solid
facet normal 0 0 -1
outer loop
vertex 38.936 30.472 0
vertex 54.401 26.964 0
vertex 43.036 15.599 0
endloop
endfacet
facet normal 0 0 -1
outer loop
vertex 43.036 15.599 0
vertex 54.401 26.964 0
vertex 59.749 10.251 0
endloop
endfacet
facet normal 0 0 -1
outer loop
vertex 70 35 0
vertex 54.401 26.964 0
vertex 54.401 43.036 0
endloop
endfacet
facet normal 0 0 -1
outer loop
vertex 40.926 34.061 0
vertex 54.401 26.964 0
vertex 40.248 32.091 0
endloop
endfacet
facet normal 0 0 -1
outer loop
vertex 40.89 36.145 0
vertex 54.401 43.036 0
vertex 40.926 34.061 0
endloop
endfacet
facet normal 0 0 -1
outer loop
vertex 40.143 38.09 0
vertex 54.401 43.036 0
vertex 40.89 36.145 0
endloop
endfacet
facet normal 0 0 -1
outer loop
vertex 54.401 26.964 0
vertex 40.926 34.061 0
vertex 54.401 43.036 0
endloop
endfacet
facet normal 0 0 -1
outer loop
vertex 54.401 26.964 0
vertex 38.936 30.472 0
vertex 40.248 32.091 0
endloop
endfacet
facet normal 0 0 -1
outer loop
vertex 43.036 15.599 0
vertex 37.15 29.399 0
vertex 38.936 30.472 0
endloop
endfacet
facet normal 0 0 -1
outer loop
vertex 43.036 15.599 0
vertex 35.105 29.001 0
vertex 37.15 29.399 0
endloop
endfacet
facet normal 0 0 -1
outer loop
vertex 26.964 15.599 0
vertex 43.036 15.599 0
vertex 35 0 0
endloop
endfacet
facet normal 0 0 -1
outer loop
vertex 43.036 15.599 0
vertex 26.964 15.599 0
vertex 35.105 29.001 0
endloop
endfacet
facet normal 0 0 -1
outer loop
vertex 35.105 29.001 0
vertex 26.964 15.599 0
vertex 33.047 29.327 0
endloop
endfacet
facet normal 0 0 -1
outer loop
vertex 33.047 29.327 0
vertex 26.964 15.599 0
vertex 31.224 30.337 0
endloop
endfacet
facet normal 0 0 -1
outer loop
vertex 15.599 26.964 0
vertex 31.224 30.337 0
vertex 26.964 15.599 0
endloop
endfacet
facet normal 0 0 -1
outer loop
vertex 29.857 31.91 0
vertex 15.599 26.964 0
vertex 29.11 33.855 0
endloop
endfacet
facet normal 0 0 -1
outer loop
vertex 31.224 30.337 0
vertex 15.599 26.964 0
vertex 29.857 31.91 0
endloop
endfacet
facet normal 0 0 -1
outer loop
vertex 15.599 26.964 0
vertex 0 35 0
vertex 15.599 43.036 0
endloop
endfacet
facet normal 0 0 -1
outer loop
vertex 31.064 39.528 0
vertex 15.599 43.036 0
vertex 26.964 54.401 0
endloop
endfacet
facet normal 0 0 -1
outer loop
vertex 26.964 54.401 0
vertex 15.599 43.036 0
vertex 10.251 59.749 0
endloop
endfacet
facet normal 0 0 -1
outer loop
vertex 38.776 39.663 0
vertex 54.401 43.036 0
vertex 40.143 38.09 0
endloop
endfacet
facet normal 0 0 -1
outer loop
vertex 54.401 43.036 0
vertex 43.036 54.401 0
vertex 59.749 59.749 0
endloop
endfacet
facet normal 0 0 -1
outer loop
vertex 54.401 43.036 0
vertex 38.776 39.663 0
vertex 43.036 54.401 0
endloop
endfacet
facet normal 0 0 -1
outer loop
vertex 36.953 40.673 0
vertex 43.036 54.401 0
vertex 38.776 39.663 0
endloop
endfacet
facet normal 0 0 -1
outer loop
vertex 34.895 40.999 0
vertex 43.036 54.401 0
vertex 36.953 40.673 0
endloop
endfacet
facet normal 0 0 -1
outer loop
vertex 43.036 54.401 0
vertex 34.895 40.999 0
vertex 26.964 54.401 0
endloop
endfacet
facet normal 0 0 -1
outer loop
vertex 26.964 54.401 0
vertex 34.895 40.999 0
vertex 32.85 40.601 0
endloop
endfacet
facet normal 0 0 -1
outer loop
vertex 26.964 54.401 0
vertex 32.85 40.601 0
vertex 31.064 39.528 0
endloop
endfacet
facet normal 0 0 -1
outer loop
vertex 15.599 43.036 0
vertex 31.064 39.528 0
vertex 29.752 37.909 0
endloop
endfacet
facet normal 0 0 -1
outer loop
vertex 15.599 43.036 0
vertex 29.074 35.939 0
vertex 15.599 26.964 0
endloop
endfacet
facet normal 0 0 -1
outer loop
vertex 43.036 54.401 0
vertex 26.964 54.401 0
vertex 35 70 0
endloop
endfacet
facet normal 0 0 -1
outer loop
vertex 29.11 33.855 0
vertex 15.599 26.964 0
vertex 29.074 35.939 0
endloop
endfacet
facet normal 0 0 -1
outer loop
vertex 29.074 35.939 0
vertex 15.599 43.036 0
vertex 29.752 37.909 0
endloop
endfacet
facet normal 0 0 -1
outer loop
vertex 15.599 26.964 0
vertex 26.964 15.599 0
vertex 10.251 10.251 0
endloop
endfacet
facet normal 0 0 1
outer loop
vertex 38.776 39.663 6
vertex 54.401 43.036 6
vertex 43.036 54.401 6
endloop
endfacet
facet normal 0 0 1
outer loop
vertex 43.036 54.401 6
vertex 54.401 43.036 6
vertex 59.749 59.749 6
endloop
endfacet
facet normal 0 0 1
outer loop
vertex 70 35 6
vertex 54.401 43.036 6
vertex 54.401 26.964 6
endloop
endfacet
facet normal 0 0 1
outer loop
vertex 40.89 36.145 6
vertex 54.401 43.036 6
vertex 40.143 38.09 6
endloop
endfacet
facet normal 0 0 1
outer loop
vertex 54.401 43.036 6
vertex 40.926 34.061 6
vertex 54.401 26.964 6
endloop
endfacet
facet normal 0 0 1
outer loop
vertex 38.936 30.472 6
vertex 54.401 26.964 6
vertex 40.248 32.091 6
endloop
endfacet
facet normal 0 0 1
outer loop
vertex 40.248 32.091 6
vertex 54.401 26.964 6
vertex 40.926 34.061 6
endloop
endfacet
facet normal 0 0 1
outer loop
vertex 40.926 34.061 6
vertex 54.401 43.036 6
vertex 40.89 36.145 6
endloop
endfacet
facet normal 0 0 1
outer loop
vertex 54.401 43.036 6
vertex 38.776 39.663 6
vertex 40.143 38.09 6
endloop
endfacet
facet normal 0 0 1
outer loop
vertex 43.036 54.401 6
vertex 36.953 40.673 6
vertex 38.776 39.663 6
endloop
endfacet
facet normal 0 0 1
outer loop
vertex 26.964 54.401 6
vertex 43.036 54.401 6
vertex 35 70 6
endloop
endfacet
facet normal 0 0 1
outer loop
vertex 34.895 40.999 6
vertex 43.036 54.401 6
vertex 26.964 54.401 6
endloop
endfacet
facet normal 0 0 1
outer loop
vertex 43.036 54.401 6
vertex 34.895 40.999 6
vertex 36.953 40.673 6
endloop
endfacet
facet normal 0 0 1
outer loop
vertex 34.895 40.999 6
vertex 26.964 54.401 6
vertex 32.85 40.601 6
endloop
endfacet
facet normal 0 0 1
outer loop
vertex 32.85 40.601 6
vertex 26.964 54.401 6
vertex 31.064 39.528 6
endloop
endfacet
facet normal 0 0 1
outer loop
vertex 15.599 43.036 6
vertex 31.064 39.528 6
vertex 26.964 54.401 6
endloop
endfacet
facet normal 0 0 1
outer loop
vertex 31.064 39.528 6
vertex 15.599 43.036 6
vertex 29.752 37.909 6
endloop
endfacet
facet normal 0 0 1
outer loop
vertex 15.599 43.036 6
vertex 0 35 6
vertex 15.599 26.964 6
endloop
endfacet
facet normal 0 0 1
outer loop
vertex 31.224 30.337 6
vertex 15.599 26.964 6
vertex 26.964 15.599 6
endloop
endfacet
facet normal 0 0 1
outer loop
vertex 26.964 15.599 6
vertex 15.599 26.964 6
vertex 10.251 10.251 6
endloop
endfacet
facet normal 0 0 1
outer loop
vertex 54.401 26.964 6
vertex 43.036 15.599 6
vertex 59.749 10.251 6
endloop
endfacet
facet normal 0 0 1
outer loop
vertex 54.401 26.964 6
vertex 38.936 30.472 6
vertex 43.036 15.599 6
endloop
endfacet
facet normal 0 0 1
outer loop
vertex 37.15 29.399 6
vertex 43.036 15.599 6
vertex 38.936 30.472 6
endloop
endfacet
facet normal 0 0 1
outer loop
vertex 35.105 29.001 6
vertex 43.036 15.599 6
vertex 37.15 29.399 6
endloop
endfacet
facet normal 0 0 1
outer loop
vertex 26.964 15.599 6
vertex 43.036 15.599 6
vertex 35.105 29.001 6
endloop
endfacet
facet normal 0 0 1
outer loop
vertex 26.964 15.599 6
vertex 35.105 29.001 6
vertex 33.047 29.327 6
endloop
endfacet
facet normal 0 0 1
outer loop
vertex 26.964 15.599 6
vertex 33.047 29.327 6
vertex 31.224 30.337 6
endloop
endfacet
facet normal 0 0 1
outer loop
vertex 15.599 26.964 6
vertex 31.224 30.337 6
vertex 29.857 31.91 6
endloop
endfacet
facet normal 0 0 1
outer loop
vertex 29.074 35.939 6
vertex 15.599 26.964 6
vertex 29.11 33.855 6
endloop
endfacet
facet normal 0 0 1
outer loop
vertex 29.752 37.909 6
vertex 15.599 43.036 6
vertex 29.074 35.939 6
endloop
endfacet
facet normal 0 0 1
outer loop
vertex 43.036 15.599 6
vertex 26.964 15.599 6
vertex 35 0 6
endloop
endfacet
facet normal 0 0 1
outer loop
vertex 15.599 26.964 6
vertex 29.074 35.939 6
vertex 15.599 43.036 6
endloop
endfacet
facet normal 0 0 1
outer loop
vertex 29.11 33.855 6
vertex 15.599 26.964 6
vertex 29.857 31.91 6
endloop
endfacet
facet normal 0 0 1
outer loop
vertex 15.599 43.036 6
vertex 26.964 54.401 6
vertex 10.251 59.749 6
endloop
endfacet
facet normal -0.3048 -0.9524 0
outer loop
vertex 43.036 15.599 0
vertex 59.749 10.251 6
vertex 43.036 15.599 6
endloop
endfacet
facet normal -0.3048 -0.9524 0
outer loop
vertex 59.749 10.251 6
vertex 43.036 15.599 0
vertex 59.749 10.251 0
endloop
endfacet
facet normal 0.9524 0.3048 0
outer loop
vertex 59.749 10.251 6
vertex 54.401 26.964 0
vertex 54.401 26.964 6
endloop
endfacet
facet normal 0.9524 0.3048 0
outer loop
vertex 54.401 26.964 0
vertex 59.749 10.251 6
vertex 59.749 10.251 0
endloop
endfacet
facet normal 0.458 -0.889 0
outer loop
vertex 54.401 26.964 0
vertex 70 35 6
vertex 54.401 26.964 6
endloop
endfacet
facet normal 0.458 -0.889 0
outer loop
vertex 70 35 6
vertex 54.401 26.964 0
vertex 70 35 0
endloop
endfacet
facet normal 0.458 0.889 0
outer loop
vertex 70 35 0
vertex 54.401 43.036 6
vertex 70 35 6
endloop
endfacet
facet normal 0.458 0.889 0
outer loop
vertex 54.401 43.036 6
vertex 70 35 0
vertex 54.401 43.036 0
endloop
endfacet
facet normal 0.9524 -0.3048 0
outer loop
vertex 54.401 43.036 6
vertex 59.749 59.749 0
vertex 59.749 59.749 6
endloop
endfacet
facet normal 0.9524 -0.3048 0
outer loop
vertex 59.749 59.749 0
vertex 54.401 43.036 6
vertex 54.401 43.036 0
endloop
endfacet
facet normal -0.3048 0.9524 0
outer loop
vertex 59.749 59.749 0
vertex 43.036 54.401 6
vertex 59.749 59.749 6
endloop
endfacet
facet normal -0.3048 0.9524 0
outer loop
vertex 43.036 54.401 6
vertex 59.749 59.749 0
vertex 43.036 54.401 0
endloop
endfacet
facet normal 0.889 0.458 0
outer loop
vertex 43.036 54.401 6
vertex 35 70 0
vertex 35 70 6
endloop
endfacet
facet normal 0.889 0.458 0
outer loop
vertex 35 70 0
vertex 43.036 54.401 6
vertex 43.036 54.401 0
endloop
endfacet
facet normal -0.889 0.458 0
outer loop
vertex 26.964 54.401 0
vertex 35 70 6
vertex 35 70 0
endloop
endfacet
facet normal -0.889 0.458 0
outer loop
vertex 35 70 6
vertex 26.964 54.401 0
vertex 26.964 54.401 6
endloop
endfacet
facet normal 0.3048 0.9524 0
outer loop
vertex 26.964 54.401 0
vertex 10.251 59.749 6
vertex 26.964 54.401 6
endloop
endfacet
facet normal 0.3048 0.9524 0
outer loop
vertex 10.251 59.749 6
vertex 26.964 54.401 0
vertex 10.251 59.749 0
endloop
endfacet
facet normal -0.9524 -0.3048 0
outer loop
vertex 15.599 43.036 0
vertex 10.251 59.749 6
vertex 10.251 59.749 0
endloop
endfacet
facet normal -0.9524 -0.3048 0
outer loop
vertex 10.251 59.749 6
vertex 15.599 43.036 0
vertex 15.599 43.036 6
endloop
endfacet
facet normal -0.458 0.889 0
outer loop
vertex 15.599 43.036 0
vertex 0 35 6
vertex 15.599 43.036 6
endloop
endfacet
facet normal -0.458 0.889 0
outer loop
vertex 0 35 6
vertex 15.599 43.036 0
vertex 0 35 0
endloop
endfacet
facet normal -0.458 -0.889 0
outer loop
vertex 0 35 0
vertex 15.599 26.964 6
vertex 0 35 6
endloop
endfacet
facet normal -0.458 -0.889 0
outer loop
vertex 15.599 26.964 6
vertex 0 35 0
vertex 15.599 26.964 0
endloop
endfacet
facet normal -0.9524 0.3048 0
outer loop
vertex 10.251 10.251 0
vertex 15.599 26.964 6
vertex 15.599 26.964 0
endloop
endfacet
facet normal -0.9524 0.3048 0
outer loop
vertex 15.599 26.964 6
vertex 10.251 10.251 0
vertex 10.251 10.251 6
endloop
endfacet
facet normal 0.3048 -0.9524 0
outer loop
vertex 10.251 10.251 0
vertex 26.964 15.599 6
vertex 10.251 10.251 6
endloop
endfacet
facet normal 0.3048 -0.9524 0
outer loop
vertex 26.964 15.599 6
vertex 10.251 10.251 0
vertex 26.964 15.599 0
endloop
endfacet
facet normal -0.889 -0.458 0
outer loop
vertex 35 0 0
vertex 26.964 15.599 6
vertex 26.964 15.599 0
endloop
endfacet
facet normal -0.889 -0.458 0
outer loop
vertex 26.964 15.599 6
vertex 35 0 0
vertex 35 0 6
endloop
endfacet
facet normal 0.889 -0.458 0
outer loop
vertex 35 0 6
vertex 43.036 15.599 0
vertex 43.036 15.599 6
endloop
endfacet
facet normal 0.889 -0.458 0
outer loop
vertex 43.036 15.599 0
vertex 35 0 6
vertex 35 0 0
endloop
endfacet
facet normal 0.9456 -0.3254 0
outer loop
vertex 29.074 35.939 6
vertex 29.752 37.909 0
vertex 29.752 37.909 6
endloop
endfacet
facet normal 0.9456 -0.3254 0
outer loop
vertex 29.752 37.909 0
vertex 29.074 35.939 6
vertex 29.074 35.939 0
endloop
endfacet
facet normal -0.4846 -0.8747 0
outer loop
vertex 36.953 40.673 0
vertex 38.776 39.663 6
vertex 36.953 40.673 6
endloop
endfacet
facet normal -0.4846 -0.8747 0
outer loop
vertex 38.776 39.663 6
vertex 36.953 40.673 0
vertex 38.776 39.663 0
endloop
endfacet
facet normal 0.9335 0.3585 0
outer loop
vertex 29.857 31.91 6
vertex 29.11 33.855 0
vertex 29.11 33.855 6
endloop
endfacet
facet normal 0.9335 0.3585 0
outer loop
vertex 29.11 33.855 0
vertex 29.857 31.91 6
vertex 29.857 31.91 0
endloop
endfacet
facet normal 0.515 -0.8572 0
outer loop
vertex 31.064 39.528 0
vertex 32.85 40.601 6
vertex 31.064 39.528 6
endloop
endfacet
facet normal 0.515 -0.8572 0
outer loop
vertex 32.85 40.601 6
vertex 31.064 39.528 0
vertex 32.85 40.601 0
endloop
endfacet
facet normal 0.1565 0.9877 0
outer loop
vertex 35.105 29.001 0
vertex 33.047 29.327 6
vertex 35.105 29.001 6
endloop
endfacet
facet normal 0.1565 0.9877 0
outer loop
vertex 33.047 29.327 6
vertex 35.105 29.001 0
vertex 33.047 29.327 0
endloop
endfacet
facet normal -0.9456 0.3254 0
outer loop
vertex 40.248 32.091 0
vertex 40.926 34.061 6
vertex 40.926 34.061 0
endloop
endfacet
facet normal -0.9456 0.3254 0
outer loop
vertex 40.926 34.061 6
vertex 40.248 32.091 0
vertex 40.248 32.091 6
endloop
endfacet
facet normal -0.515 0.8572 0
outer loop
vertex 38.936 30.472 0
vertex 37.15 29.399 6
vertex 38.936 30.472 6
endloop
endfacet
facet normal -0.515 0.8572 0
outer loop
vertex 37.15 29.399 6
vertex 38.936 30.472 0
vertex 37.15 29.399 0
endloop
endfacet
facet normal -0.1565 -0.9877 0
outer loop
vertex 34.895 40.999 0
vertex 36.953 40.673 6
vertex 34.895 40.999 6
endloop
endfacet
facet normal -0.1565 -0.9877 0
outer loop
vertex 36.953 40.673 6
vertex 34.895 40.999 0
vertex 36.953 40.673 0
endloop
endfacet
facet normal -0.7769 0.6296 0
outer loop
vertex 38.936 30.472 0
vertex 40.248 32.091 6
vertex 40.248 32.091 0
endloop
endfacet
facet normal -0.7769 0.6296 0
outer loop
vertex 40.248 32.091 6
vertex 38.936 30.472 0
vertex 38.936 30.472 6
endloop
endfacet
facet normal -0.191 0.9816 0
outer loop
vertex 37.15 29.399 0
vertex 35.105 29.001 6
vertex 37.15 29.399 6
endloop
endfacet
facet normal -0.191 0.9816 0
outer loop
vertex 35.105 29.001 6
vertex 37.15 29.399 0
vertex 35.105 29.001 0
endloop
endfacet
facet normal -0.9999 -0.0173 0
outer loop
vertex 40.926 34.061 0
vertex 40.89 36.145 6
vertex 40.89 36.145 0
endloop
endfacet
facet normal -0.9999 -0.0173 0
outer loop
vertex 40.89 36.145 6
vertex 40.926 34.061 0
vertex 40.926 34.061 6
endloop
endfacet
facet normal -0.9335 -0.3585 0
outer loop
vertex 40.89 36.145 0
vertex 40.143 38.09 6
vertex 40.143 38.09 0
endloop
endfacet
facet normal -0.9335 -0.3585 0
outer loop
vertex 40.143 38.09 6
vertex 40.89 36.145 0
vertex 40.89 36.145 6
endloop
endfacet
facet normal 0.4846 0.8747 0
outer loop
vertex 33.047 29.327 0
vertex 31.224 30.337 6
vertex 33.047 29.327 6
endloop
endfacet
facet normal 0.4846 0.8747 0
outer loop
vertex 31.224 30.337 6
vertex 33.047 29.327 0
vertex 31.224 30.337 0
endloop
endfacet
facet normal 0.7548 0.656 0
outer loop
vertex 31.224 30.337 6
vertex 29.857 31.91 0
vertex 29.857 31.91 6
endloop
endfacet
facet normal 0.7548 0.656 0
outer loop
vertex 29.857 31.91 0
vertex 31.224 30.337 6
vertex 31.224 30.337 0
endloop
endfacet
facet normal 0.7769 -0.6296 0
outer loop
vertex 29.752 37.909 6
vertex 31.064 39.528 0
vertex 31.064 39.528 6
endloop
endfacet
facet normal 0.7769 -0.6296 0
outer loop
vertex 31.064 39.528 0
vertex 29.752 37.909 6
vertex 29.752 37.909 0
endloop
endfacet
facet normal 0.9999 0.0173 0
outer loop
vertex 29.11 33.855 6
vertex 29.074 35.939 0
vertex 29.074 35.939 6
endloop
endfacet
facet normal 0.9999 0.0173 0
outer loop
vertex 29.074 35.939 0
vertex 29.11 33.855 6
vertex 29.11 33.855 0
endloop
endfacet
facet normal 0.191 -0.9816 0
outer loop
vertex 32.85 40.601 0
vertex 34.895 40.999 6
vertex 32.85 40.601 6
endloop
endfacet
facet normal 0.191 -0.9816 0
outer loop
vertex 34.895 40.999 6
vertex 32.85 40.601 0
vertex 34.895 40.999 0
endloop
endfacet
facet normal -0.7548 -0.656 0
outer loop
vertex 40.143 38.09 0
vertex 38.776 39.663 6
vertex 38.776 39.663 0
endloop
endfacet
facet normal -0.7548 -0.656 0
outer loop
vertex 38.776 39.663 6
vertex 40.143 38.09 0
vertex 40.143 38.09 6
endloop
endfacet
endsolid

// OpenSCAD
$fn = 32;

// ----------------------------------------------------------------------
// Star wheel: 8-point star, R35
// ----------------------------------------------------------------------

// --- parameters (mm) ---
n_points = 8;             // number of points / teeth
r_out = 35;               // tip radius
r_in = 21;                // root radius
bore_r = 6;               // centre bore radius
plate_t = 6;              // plate thickness, Z (extrusion height)
bore_d = 12;              // centre bore diameter

profile = [[0, 35], [15.599, 26.964], [10.251, 10.251], [26.964, 15.599], [35, 0], [43.036, 15.599], [59.749, 10.251], [54.401, 26.964], [70, 35], [54.401, 43.036], [59.749, 59.749], [43.036, 54.401], [35, 70], [26.964, 54.401], [10.251, 59.749], [15.599, 43.036]];  // primary outline, 16 points, counter clockwise
void_1 = [[40.89, 36.145], [40.143, 38.09], [38.776, 39.663], [36.953, 40.673], [34.895, 40.999], [32.85, 40.601], [31.064, 39.528], [29.752, 37.909], [29.074, 35.939], [29.11, 33.855], [29.857, 31.91], [31.224, 30.337], [33.047, 29.327], [35.105, 29.001], [37.15, 29.399], [38.936, 30.472], [40.248, 32.091], [40.926, 34.061]];  // centre bore, 18 points

// --- the one profile operation ---
difference() {
  linear_extrude(height = plate_t) polygon(points = profile);
  translate([0, 0, -1])
    linear_extrude(height = plate_t + 2) polygon(points = void_1);
}
